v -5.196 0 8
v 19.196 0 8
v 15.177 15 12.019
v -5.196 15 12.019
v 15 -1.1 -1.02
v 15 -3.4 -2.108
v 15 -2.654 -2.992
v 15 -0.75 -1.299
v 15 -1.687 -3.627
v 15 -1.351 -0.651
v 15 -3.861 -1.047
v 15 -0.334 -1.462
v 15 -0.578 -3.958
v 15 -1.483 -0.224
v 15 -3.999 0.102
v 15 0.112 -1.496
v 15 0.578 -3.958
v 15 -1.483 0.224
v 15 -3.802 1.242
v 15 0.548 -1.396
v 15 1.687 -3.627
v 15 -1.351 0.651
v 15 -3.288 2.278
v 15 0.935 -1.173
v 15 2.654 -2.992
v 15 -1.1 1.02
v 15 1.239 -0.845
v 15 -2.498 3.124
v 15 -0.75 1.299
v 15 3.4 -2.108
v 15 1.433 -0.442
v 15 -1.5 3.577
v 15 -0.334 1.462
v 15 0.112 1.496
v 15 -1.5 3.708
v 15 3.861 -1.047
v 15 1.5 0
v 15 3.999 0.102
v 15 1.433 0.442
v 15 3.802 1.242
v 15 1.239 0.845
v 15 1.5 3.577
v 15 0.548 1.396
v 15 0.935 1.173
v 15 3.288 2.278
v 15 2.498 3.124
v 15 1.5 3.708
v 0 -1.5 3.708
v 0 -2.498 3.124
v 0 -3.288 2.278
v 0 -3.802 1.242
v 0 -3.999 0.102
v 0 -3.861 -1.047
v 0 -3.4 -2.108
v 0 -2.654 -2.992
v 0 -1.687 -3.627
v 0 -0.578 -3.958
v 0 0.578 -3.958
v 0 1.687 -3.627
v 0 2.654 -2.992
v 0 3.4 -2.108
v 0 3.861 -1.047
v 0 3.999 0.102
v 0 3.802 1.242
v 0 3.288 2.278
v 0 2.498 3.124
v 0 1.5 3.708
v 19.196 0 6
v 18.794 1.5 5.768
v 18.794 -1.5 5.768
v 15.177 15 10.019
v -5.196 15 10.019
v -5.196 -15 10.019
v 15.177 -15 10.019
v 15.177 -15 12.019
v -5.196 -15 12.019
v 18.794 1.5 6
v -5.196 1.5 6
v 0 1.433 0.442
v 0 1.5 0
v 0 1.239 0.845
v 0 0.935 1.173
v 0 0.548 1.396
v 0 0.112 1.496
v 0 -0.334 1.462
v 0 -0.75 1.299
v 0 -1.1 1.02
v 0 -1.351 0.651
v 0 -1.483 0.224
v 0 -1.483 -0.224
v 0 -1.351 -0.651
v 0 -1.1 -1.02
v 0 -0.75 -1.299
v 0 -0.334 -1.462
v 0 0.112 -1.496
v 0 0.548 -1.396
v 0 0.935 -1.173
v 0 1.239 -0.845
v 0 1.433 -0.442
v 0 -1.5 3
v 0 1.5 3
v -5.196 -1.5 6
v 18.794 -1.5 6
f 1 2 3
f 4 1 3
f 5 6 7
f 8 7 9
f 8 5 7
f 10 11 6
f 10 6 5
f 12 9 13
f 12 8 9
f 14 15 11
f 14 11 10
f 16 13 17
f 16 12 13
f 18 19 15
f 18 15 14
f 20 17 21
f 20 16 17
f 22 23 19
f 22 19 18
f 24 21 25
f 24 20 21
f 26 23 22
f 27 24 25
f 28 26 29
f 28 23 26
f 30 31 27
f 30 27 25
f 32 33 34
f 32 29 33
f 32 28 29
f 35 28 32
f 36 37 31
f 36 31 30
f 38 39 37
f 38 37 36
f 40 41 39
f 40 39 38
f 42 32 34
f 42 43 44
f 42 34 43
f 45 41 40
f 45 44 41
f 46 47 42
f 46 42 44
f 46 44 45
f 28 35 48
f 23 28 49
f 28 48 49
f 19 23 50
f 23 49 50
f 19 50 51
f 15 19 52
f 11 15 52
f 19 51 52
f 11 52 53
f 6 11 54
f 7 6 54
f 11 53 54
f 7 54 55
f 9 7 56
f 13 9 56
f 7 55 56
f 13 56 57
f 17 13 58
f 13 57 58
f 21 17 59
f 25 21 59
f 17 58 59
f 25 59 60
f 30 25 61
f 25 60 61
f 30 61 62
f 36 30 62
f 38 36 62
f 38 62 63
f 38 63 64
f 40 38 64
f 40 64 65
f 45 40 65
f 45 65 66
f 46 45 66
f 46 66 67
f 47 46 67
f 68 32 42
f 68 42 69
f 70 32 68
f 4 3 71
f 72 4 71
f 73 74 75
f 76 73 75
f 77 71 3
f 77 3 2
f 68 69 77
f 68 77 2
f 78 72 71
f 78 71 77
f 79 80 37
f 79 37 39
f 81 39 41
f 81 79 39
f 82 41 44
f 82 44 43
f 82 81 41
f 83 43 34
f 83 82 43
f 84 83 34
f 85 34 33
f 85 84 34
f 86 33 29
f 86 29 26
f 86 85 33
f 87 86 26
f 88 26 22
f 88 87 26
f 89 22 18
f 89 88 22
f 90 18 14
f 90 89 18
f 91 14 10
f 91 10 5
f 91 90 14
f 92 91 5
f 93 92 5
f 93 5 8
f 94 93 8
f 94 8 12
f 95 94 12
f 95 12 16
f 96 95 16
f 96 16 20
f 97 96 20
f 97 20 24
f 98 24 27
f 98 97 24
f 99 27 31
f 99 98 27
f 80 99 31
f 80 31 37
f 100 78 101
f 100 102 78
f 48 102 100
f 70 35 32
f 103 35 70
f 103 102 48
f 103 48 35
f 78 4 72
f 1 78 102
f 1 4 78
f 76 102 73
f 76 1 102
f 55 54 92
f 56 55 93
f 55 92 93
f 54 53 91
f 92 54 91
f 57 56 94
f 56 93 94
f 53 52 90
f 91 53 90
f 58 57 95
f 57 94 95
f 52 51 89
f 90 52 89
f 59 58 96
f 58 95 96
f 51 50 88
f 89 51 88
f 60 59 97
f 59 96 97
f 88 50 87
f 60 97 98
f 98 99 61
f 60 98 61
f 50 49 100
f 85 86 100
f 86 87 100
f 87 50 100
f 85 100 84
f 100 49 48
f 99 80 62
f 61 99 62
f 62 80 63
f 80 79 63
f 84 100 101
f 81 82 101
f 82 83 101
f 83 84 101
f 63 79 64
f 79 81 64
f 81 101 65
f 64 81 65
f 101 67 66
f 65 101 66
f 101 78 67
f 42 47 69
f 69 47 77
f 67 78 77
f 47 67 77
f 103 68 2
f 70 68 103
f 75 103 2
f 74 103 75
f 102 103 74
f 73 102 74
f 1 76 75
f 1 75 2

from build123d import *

# Parameters (mm, degrees)
F0_R     = 4
F0_R_2   = 1.5
F1_DEPTH = 15
F3_DEPTH = 1.5
F5_DEPTH = 24.3923048454
F7_DEPTH = 25


with BuildPart() as f1:
    # F0 (on Right) → F1 (new body)
    with BuildSketch(Plane.YZ):
        Circle(F0_R)
        Circle(F0_R_2, mode=Mode.SUBTRACT)
    extrude(amount=F1_DEPTH)

    # F2 (on Front) → F3 (join, symmetric)
    with BuildSketch(Plane.XZ):
        Polygon((-5.1961524227, 6), (0, 3), (14, 3), (19.1961524227, 6), (19.1961524227, 8), (-5.1961524227, 8), align=None)
    extrude(amount=F3_DEPTH, both=True)

    # F4 (on face) → F5 (join, through all)
    with BuildSketch(Plane(origin=(-5.1961524227, 0, 0), x_dir=(0, -1, 0), z_dir=(-1, 0, 0))):
        Polygon((15, 12.0192378865), (0, 8), (1.5, 6), (15, 10.0192378865), align=None)
        Polygon((-1.5, 6), (0, 8), (-15, 12.0192378865), (-15, 10.0192378865), align=None)
    extrude(amount=-F5_DEPTH)

    # F6 (on Top) → F7 (cut)
    with BuildSketch(Plane.XY):
        Polygon((14.137943439, 18.8774929223), (19.1961524227, 0), (14.137943439, -18.8774929223), (27.2481460124, -18.8774929223), (27.2481460124, 0), (27.2481460124, 18.8774929223), align=None)
    extrude(amount=F7_DEPTH, mode=Mode.SUBTRACT)


solid = f1.part
